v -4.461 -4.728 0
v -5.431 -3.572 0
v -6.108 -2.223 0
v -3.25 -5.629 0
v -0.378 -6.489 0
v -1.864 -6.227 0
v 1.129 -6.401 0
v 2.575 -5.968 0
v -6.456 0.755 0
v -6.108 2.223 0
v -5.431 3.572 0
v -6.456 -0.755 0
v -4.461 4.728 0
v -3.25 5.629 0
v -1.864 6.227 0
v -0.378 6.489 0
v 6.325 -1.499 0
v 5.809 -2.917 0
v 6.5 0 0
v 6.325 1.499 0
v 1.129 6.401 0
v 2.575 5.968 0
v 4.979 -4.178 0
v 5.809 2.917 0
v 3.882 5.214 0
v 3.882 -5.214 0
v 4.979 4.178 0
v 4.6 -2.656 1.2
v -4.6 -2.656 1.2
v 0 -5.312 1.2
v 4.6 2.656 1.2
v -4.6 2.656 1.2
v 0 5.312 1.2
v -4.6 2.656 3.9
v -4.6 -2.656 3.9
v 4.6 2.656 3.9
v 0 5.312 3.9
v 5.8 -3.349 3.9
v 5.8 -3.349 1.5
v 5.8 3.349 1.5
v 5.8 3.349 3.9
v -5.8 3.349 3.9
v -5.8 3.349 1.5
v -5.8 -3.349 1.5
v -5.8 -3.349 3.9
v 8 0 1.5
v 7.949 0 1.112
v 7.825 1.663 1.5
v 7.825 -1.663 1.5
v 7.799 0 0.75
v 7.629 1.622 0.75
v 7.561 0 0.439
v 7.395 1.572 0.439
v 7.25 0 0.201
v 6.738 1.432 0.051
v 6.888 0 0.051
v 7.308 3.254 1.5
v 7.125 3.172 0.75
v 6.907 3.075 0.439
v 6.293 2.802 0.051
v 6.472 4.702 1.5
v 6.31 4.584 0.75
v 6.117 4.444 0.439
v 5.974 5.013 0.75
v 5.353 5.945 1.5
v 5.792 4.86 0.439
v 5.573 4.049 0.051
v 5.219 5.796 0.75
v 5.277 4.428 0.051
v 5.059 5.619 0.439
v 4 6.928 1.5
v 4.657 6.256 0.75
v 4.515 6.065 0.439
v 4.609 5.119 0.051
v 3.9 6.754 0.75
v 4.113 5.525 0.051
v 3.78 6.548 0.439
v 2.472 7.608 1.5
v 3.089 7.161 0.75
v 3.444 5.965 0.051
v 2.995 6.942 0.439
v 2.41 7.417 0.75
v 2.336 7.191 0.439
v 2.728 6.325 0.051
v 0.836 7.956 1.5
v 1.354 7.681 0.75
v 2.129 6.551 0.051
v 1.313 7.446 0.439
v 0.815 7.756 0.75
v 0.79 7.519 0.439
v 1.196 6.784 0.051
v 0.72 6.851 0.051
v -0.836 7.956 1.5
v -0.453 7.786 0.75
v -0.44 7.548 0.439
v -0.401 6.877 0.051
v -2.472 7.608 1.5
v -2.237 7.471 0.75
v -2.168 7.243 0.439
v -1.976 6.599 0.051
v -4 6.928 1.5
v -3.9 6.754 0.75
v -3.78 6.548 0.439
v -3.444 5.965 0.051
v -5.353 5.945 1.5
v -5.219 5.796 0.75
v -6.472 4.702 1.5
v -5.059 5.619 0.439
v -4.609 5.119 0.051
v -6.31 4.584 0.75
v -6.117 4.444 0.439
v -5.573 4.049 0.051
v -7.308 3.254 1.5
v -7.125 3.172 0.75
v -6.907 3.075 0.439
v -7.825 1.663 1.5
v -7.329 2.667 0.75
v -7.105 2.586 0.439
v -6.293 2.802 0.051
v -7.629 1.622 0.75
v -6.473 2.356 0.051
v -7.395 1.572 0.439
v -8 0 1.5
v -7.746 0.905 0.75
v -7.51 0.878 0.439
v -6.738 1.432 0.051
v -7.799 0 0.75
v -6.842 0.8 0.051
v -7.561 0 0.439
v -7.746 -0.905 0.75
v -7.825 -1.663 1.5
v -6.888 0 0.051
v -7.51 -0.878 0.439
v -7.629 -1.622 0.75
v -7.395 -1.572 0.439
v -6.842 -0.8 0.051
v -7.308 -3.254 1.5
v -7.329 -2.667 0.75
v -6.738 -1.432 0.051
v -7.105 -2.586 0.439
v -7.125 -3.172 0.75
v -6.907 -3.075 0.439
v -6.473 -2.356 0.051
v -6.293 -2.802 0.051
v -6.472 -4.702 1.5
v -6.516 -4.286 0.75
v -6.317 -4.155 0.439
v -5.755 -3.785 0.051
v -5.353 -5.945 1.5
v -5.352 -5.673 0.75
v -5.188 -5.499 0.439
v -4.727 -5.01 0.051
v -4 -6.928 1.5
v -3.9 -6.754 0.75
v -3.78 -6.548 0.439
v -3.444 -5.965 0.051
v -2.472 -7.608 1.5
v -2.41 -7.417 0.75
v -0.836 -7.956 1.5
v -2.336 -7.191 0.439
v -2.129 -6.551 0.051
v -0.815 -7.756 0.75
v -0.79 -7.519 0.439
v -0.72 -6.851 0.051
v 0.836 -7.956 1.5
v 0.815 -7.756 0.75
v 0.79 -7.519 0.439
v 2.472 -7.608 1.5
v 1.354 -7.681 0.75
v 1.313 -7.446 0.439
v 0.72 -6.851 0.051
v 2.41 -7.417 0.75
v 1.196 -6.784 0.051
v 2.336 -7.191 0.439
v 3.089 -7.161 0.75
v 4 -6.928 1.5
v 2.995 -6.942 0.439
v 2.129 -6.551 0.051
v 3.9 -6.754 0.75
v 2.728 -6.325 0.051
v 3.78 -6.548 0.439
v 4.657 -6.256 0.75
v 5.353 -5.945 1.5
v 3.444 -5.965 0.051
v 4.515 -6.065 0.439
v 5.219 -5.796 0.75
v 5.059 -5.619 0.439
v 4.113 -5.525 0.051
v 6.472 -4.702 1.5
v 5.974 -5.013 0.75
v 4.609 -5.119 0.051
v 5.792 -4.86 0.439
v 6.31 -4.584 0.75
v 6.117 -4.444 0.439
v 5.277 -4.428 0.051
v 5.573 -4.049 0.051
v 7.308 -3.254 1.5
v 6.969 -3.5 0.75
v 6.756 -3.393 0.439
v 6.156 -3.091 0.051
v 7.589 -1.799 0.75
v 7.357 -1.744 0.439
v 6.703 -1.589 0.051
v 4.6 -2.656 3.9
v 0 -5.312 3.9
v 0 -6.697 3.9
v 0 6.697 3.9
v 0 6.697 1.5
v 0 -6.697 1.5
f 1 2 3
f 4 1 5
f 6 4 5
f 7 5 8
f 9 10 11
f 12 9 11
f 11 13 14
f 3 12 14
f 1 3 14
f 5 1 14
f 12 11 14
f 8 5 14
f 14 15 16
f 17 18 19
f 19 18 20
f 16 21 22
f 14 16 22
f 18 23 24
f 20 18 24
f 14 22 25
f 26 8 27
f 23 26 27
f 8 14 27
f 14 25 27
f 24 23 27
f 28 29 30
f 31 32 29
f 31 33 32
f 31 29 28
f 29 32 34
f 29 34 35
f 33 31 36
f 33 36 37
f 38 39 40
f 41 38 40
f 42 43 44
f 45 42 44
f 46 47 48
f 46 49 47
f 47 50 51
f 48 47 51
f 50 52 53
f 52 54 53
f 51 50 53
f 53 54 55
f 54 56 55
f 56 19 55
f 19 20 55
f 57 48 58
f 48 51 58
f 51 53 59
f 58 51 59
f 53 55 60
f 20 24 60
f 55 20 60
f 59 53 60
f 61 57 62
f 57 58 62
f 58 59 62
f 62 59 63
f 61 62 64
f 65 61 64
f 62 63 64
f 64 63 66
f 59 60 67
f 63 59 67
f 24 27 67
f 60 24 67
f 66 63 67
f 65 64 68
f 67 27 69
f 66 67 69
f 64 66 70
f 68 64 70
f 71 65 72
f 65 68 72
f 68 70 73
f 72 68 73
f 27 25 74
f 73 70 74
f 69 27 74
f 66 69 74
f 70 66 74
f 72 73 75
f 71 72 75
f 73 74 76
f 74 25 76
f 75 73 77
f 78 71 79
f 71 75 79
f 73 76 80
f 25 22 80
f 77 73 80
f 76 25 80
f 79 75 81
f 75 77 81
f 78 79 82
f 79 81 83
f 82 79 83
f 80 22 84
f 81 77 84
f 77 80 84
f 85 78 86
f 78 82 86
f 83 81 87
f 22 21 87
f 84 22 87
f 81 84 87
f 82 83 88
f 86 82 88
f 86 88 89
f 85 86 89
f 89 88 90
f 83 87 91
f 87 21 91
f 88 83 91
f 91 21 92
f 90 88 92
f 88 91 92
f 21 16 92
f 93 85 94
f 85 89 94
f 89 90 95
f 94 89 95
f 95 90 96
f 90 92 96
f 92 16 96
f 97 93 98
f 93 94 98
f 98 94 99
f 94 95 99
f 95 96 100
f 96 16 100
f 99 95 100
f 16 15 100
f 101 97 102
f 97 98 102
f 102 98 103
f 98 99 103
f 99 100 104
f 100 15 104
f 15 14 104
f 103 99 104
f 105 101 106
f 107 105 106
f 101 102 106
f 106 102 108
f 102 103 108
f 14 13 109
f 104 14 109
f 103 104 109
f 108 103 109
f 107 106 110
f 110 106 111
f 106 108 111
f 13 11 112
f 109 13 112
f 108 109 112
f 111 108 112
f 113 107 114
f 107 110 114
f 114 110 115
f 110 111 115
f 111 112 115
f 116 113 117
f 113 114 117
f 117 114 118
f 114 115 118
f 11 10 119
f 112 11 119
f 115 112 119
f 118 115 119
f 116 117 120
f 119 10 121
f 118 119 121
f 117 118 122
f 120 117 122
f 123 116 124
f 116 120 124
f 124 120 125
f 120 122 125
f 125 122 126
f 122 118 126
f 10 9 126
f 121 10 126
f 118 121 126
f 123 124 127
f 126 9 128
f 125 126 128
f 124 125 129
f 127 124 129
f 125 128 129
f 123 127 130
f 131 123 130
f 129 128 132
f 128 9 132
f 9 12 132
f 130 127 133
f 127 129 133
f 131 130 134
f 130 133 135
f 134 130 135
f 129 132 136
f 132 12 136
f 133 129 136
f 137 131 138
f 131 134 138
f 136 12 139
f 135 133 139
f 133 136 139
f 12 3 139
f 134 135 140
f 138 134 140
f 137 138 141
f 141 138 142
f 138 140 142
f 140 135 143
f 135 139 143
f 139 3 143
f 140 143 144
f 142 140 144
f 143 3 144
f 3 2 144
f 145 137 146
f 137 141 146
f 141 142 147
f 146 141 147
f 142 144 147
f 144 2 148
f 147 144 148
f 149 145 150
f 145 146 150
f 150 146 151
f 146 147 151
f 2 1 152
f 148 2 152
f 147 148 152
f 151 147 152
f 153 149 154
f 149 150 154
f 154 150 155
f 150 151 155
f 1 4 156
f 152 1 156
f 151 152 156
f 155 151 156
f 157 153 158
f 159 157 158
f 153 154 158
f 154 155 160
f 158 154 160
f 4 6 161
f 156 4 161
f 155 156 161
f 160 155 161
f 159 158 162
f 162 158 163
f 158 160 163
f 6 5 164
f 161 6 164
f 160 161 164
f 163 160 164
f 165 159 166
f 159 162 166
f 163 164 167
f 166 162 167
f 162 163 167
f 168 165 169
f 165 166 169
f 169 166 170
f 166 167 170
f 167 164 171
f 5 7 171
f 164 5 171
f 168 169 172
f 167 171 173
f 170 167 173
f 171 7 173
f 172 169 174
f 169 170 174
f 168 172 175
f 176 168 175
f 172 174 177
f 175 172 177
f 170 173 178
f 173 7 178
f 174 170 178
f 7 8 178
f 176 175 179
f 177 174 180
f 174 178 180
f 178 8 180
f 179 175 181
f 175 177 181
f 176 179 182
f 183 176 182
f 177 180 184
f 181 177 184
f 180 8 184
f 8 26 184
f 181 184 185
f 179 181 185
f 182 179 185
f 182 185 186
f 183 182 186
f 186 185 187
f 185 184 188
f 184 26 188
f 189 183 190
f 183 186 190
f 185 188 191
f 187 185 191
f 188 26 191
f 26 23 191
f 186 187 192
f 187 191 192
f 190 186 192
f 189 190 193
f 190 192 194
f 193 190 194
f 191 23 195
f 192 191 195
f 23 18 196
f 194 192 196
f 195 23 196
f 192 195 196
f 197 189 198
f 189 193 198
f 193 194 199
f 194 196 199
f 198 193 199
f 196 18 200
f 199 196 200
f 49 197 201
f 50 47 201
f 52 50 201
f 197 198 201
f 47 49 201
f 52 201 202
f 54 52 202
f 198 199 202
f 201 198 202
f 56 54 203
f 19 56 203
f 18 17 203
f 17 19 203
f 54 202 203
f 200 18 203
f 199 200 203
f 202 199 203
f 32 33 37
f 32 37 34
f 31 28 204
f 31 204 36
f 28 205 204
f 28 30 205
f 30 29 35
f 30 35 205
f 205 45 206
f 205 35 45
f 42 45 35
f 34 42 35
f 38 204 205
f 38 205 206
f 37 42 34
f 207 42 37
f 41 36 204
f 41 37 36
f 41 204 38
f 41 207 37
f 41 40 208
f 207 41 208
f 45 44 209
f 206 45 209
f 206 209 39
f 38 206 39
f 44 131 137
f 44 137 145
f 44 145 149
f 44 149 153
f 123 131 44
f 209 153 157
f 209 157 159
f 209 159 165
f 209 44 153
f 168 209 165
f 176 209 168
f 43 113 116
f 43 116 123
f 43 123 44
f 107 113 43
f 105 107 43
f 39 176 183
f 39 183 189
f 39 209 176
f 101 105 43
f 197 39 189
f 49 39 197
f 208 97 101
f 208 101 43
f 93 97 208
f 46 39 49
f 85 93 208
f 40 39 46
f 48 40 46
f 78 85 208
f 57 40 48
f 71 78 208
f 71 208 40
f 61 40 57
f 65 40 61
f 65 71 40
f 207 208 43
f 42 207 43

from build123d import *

# Parameters (mm, degrees)
F0_R     = 8
F1_DEPTH = 1.5
F3_DEPTH = 2.4
F4_T     = -1.2
F5_R     = 1.49999


# Not quite as in the source:
# - a fillet or chamfer is up to 0.001 mm smaller than in the source, because OpenCascade refuses the exact size


with BuildPart() as f1:
    # F0 (on Top) → F1 (new body)
    with BuildSketch(Plane.XY):
        Circle(F0_R)
    extrude(amount=F1_DEPTH)

    # F2 (on face) → F3 (join)
    with BuildSketch(Plane.XY.offset(1.5)):
        Polygon((5.8, -3.3486315613), (5.8, 3.3486315613), (0, 6.6972631226), (-5.8, 3.3486315613), (-5.8, -3.3486315613), (0, -6.6972631226), align=None)
    extrude(amount=F3_DEPTH)

    # F4
    f4_openings = [f1.faces().sort_by_distance(p)[0] for p in [
        (0, 0, 3.9),
    ]]
    offset(amount=F4_T, openings=f4_openings, kind=Kind.INTERSECTION)

    # F5 (radius 1.5 in the source; OpenCascade refuses exactly that, so slightly less here)
    f5_edges = [f1.edges().sort_by_distance(p)[0] for p in [
        (-8, 0, 0),
    ]]
    fillet(f5_edges, radius=F5_R)


solid = f1.part
